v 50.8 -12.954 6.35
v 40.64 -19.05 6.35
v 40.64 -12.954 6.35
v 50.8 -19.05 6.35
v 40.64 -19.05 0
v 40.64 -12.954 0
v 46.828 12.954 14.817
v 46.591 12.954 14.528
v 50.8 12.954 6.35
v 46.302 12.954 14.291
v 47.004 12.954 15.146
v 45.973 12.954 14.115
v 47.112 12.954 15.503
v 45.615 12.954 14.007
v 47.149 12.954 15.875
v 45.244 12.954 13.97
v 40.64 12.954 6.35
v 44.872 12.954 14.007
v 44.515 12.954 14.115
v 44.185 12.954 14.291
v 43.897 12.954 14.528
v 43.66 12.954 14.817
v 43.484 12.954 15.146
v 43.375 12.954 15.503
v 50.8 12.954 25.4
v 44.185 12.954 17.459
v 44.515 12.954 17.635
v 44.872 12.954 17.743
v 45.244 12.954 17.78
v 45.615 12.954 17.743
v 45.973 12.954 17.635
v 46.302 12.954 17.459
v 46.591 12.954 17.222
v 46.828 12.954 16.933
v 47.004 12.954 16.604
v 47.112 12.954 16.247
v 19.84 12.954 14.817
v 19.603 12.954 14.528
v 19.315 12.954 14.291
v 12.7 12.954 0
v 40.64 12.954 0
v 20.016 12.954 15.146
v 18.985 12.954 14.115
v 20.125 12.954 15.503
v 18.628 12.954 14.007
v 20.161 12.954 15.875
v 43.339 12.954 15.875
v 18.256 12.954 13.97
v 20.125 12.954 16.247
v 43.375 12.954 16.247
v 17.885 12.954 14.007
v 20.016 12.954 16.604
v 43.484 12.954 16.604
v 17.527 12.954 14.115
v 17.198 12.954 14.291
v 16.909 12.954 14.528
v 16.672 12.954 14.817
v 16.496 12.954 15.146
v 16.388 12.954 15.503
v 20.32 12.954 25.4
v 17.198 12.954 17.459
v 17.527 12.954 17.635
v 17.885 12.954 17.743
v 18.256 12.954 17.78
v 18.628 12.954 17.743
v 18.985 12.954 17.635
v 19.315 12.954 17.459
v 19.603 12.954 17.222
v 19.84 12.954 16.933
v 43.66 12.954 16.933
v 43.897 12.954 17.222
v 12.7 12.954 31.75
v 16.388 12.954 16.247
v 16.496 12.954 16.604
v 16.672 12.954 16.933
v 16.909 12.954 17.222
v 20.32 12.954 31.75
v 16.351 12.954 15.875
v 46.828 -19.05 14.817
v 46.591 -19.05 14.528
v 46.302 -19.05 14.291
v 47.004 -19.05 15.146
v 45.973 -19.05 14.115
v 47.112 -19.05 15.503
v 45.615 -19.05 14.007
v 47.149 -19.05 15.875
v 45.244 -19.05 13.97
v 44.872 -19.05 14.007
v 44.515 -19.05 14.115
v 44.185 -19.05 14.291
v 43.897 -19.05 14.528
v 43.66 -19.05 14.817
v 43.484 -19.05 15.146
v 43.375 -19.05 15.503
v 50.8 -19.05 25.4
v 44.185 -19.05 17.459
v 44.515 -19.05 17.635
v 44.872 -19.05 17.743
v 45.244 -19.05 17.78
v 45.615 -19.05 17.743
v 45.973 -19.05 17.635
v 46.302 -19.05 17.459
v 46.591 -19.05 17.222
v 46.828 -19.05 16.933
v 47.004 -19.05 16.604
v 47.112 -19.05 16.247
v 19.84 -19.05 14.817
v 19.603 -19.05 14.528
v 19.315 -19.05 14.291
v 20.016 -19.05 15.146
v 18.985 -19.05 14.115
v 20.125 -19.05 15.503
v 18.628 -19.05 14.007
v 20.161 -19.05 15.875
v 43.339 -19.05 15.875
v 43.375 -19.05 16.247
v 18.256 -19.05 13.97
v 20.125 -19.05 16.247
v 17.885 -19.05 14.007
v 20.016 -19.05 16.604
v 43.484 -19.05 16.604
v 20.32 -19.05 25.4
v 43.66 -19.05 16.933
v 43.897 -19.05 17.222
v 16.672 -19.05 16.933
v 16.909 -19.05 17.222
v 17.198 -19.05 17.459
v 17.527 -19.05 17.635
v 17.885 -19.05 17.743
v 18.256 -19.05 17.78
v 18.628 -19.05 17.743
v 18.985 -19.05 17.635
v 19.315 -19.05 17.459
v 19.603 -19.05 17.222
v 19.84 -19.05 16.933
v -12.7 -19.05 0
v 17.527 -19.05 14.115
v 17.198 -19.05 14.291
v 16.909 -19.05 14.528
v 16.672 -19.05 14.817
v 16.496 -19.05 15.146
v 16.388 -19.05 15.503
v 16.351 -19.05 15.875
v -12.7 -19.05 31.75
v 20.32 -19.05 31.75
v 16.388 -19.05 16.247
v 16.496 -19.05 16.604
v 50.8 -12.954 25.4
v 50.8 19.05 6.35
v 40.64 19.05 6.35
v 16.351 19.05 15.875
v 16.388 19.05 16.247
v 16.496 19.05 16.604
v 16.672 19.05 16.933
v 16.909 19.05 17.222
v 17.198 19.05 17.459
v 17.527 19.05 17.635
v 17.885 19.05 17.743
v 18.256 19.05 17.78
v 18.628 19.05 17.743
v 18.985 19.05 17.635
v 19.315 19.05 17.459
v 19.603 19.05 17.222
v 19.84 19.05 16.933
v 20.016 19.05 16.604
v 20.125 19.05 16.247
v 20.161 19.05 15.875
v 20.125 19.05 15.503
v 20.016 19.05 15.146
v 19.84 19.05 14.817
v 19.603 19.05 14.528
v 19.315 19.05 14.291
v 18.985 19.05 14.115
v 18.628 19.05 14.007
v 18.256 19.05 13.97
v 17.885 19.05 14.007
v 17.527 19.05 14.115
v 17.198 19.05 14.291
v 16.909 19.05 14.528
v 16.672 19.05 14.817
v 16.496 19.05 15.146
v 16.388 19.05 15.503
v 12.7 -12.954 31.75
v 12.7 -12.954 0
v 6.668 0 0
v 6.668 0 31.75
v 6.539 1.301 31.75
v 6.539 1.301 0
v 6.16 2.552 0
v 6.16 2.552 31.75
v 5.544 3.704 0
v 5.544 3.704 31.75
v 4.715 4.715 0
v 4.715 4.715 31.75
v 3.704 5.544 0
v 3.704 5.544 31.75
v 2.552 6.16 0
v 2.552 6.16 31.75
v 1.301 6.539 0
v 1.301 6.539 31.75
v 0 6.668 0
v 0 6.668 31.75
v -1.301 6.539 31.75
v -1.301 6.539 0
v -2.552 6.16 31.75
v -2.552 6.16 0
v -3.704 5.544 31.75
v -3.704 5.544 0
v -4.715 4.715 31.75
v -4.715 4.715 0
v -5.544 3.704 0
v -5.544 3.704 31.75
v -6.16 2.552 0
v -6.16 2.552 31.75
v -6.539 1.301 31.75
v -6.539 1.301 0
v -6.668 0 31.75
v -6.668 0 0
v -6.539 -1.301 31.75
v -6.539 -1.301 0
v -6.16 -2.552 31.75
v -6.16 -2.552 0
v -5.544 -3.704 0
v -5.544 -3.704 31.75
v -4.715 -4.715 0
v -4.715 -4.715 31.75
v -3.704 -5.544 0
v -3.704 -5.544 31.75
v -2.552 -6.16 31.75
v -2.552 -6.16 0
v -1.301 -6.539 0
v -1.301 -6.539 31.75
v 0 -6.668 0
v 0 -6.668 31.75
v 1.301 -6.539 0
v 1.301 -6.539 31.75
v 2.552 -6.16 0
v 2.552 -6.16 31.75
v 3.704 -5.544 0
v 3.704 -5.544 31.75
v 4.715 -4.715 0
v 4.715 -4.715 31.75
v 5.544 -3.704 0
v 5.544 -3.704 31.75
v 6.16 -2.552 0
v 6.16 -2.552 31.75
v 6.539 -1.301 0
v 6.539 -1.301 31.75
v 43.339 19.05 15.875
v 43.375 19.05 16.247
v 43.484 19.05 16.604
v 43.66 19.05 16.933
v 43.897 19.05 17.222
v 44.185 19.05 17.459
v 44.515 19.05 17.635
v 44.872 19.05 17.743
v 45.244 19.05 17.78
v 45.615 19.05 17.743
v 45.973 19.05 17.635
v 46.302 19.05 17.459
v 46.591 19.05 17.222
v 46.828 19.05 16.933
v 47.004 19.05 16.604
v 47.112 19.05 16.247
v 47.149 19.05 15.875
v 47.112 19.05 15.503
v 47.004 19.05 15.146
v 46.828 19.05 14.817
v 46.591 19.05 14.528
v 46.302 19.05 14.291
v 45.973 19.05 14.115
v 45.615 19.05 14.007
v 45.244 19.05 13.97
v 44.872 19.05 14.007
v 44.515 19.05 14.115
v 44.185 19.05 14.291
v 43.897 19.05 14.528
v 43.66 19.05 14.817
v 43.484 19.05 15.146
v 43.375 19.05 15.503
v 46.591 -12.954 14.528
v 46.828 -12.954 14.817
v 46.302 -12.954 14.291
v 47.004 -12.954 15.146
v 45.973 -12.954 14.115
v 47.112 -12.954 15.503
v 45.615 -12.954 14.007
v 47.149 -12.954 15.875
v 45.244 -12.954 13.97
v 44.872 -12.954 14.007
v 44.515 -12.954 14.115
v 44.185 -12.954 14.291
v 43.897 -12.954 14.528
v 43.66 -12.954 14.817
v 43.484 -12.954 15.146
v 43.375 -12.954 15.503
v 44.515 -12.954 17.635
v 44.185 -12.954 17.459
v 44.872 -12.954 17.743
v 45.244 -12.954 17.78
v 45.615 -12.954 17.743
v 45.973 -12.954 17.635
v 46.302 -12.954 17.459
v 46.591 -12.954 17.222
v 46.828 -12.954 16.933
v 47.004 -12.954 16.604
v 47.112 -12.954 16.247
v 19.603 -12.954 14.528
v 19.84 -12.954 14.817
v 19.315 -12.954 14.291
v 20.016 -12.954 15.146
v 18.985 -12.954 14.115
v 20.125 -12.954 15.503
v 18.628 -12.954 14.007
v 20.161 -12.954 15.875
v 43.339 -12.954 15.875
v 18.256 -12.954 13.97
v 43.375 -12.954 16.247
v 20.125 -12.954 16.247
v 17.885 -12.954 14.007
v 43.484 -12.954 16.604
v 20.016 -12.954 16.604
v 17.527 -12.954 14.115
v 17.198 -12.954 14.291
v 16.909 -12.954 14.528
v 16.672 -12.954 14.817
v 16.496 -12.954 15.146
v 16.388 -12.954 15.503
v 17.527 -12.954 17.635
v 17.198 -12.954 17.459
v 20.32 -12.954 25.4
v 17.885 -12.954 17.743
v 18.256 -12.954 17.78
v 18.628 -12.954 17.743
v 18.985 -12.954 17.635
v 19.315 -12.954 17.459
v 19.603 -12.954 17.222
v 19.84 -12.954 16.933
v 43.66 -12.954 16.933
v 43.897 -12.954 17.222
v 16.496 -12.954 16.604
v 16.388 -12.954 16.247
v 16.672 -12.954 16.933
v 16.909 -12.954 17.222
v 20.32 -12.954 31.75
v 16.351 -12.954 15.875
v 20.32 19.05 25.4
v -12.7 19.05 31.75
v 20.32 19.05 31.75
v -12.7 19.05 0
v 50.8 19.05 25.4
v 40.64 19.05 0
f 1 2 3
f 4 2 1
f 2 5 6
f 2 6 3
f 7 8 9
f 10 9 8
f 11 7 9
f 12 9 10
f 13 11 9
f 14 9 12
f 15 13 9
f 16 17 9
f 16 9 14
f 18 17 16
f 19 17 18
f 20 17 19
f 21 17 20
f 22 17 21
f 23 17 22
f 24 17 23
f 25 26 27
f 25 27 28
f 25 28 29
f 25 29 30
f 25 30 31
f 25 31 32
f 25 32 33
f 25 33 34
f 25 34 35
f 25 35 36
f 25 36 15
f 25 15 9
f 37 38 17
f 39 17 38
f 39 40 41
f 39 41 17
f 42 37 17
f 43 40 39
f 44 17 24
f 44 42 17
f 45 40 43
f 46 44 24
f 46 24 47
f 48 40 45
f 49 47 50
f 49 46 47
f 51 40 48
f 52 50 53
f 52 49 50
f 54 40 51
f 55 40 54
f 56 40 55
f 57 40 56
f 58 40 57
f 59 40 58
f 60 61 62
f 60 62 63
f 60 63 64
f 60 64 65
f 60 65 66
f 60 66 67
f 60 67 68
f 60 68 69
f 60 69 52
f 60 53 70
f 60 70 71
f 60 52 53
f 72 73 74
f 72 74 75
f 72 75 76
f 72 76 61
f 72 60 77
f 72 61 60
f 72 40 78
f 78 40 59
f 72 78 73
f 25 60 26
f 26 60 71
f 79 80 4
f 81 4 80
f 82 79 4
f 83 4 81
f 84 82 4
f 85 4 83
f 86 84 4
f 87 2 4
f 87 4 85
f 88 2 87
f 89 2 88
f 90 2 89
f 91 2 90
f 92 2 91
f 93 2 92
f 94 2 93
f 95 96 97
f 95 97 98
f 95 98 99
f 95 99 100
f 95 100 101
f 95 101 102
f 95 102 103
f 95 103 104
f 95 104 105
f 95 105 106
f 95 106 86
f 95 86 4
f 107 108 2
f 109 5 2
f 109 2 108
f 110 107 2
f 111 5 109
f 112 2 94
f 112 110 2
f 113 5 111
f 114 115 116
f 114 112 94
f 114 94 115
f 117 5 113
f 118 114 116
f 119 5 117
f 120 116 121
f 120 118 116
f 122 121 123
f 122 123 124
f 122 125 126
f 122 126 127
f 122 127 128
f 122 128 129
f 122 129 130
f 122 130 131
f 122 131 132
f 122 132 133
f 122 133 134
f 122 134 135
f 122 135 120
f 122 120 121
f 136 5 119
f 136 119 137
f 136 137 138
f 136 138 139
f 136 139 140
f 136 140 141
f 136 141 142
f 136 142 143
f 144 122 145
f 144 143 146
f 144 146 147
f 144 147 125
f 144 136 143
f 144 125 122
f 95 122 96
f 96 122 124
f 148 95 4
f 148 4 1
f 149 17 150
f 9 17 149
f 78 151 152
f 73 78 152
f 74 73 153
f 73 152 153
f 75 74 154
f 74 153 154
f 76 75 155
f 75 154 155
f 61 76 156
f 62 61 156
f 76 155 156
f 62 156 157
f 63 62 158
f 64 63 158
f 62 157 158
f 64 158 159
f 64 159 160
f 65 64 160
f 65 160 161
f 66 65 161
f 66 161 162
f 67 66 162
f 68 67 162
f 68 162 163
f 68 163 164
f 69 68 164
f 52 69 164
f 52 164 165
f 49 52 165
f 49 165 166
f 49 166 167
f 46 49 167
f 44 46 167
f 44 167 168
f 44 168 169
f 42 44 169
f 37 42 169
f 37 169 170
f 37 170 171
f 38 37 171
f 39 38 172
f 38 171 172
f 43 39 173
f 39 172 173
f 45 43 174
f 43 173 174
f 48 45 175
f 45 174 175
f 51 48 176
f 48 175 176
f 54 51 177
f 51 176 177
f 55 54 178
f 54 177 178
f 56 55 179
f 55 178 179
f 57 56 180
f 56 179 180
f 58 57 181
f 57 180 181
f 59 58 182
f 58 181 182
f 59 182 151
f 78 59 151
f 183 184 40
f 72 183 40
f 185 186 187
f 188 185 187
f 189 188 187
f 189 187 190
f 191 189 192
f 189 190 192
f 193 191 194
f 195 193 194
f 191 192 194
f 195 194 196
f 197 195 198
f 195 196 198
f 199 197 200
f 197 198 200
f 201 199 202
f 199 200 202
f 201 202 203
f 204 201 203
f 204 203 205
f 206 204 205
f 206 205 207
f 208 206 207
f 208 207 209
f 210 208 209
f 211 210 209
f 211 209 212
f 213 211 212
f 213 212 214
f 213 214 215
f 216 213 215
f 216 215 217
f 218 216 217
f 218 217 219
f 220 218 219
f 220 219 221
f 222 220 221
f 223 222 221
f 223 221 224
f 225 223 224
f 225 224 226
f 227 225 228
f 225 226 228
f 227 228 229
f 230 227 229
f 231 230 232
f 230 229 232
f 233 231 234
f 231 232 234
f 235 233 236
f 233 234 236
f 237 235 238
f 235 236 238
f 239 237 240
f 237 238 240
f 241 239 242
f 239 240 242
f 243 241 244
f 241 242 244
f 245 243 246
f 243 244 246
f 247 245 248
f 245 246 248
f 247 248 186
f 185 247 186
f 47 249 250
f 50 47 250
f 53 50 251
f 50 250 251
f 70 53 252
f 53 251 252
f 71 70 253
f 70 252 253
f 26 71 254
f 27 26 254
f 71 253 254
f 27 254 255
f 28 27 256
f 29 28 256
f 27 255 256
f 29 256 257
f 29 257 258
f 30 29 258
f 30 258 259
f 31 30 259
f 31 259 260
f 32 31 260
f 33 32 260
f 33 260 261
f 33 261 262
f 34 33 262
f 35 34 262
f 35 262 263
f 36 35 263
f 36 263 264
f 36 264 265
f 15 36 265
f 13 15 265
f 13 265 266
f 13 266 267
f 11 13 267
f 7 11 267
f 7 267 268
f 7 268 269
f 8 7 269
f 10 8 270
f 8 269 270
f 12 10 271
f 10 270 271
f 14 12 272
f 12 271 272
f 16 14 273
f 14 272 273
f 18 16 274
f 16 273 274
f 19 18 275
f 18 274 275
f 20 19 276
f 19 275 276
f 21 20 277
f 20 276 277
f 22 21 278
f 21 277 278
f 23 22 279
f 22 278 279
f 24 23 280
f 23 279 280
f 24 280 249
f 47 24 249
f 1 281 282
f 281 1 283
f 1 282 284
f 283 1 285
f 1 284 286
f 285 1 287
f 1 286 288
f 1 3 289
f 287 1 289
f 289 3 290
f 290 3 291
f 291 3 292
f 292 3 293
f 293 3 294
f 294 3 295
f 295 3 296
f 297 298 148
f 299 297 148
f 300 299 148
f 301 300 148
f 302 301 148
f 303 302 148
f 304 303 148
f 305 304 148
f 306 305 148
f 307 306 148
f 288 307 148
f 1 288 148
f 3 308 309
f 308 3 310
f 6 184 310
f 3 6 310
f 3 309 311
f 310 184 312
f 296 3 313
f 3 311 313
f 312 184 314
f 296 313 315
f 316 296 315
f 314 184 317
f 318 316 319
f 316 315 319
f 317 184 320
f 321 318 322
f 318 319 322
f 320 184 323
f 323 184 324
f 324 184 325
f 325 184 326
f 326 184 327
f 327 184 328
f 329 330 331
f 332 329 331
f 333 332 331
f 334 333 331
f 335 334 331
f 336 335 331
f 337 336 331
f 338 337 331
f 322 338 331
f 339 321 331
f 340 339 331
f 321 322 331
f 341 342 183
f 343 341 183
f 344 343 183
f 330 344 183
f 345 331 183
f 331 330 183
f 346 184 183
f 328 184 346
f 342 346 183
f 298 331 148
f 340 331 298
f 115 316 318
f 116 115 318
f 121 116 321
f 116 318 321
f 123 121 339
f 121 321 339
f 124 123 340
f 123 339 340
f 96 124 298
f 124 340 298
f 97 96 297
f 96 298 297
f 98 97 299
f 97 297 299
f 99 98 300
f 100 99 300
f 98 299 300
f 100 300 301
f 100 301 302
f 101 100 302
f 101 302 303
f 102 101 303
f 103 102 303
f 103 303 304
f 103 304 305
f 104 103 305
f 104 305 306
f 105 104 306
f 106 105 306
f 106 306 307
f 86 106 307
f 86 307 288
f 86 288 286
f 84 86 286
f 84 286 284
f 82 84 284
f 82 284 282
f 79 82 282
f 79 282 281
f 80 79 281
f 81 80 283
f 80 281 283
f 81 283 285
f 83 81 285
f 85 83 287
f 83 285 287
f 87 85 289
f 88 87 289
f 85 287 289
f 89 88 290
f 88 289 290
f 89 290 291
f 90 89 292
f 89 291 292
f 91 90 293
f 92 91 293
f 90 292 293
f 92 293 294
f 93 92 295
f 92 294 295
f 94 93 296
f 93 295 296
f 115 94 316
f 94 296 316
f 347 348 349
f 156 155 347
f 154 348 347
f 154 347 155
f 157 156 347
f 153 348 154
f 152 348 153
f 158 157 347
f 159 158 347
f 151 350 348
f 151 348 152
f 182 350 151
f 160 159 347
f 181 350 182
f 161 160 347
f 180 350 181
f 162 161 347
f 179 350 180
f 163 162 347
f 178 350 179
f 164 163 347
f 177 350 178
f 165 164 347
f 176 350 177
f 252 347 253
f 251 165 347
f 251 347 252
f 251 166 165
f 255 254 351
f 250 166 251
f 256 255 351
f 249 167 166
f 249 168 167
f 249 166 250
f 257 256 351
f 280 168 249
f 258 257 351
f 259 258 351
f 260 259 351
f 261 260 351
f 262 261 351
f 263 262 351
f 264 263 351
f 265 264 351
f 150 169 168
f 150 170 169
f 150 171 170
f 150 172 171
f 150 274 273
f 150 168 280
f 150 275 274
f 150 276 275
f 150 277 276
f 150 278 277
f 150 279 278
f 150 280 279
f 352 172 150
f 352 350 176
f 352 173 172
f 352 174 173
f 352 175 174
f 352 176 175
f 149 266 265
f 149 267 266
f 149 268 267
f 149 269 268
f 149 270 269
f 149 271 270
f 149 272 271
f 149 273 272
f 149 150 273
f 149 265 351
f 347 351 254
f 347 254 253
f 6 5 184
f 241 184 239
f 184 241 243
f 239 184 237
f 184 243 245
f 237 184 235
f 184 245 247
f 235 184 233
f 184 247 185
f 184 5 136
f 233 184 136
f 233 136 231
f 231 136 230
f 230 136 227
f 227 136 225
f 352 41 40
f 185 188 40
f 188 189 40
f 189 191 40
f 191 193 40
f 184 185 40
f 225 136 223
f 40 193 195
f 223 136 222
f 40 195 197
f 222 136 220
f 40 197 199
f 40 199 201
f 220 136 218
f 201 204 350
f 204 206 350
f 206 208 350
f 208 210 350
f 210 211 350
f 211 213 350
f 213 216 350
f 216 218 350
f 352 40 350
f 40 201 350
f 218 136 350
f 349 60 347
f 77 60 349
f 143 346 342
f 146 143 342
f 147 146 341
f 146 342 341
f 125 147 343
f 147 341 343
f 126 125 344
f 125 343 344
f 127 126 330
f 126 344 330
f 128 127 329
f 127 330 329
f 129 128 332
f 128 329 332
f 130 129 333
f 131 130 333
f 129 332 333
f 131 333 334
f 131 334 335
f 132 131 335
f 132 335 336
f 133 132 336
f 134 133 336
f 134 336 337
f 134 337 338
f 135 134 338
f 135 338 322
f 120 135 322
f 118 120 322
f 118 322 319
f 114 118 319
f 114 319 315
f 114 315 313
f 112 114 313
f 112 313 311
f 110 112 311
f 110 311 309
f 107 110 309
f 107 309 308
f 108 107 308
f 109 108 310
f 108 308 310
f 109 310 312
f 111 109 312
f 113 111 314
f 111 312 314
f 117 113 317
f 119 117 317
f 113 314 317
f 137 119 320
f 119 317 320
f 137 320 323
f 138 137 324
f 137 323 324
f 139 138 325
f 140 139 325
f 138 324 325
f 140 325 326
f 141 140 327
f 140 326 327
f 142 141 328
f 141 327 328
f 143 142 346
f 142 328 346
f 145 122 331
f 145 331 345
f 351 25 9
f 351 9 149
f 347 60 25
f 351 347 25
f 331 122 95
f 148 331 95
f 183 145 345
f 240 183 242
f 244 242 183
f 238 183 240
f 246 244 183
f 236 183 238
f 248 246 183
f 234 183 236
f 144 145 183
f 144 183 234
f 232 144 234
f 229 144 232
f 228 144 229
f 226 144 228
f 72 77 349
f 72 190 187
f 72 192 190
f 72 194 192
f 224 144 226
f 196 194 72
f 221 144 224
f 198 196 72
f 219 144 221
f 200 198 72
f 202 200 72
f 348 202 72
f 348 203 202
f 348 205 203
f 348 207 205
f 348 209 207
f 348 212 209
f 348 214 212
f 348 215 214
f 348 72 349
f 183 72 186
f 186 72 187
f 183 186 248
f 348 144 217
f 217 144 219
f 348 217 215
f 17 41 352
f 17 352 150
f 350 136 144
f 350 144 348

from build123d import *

# Parameters (mm, degrees)
F0_W     = 25.4
F0_H     = 38.1
F1_DEPTH = 31.75
F2_W     = 6.096
F2_H     = 31.75
F3_DEPTH = 38.1
F4_R     = 6.6675
F5_DEPTH = 31.751
F6_R     = 1.905
F7_DEPTH = 38.101
F8_W     = 10.16
F8_H     = 6.35
F8_W_2   = 30.48
F9_DEPTH = 38.101


with BuildPart() as f1:
    # F0 (on Top) → F1 (new body)
    with BuildSketch(Plane.XY):
        Rectangle(F0_W, F0_H)
    extrude(amount=F1_DEPTH)

    # F2 (on face) → F3 (join)
    with BuildSketch(Plane.YZ.offset(12.7)):
        with Locations((-16.002, 15.875)):
            Rectangle(F2_W, F2_H)
        with Locations((16.002, 15.875)):
            Rectangle(F2_W, F2_H)
    extrude(amount=F3_DEPTH)

    # F4 (on face) → F5 (cut, through all)
    with BuildSketch(Plane.XY.offset(31.75)):
        Circle(F4_R)
    extrude(amount=-F5_DEPTH, mode=Mode.SUBTRACT)

    # F6 (on face) → F7 (cut, through all)
    with BuildSketch(Plane(origin=(0, 19.05, 0), x_dir=(-1, 0, 0), z_dir=(0, 1, 0))):
        with Locations((-45.24375, 15.875)):
            Circle(F6_R)
        with Locations((-18.25625, 15.875)):
            Circle(F6_R)
    extrude(amount=-F7_DEPTH, mode=Mode.SUBTRACT)

    # F8 (on face) → F9 (cut, through all)
    with BuildSketch(Plane.XZ.offset(19.05)):
        with Locations((45.72, 3.175)):
            Rectangle(F8_W, F8_H)
        with Locations((35.56, 28.575)):
            Rectangle(F8_W_2, F8_H)
    extrude(amount=-F9_DEPTH, mode=Mode.SUBTRACT)


solid = f1.part
